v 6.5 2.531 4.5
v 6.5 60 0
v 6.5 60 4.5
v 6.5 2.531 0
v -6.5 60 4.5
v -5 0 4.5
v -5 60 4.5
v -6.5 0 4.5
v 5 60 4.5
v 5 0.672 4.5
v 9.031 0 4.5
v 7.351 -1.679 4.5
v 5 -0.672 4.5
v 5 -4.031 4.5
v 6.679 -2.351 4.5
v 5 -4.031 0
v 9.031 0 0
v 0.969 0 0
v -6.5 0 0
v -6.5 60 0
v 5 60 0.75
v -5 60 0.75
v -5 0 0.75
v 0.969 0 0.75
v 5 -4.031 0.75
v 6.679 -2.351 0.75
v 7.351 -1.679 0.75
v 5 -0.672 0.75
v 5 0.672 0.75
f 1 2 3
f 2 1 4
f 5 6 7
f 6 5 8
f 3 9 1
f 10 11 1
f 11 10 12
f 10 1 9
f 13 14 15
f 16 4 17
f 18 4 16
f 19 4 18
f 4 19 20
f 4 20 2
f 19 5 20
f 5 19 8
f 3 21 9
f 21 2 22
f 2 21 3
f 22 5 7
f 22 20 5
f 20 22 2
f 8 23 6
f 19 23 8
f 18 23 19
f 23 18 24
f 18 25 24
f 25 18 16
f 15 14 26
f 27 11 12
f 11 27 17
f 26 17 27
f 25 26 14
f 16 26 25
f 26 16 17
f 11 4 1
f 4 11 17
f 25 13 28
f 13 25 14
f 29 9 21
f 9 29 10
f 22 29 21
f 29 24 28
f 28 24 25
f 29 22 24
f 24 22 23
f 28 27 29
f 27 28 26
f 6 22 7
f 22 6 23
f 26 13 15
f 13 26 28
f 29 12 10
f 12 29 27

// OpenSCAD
$fn=8;




ts=1.5; // толщина стенки
tp=1;//диаметр жилы
tpr=1.7;//диаметр провода
dd=0.3;
pin=[0.65+dd,0.65+dd,11.5];
lin=[10,60,3];//ширина, длина, толщина



//translate([0, 0,lin.z+knt.y/2]) cube([ts,step,knt.y],true);

all();
module all(){
    difference(){
        union(){
            translate([0,lin.y/2,(ts+lin.z)/2]) cube([lin.x+2*ts,lin.y,lin.z+ts],true);
            translate([lin.x/2,0,(ts+lin.z)/2]) rotate([0,0,45])cube([pin.x*6,pin.y*6,lin.z+ts],true);
        }
        translate([0,lin.y/2,(ts+lin.z)/2+ts/2]) cube([lin.x,lin.y*2,lin.z+ts],true);
        translate([lin.x/2,0,(ts+lin.z)/2+ts/2]) rotate([0,0,45])cube([pin.x,pin.z,lin.z+ts],true);

    }
}
